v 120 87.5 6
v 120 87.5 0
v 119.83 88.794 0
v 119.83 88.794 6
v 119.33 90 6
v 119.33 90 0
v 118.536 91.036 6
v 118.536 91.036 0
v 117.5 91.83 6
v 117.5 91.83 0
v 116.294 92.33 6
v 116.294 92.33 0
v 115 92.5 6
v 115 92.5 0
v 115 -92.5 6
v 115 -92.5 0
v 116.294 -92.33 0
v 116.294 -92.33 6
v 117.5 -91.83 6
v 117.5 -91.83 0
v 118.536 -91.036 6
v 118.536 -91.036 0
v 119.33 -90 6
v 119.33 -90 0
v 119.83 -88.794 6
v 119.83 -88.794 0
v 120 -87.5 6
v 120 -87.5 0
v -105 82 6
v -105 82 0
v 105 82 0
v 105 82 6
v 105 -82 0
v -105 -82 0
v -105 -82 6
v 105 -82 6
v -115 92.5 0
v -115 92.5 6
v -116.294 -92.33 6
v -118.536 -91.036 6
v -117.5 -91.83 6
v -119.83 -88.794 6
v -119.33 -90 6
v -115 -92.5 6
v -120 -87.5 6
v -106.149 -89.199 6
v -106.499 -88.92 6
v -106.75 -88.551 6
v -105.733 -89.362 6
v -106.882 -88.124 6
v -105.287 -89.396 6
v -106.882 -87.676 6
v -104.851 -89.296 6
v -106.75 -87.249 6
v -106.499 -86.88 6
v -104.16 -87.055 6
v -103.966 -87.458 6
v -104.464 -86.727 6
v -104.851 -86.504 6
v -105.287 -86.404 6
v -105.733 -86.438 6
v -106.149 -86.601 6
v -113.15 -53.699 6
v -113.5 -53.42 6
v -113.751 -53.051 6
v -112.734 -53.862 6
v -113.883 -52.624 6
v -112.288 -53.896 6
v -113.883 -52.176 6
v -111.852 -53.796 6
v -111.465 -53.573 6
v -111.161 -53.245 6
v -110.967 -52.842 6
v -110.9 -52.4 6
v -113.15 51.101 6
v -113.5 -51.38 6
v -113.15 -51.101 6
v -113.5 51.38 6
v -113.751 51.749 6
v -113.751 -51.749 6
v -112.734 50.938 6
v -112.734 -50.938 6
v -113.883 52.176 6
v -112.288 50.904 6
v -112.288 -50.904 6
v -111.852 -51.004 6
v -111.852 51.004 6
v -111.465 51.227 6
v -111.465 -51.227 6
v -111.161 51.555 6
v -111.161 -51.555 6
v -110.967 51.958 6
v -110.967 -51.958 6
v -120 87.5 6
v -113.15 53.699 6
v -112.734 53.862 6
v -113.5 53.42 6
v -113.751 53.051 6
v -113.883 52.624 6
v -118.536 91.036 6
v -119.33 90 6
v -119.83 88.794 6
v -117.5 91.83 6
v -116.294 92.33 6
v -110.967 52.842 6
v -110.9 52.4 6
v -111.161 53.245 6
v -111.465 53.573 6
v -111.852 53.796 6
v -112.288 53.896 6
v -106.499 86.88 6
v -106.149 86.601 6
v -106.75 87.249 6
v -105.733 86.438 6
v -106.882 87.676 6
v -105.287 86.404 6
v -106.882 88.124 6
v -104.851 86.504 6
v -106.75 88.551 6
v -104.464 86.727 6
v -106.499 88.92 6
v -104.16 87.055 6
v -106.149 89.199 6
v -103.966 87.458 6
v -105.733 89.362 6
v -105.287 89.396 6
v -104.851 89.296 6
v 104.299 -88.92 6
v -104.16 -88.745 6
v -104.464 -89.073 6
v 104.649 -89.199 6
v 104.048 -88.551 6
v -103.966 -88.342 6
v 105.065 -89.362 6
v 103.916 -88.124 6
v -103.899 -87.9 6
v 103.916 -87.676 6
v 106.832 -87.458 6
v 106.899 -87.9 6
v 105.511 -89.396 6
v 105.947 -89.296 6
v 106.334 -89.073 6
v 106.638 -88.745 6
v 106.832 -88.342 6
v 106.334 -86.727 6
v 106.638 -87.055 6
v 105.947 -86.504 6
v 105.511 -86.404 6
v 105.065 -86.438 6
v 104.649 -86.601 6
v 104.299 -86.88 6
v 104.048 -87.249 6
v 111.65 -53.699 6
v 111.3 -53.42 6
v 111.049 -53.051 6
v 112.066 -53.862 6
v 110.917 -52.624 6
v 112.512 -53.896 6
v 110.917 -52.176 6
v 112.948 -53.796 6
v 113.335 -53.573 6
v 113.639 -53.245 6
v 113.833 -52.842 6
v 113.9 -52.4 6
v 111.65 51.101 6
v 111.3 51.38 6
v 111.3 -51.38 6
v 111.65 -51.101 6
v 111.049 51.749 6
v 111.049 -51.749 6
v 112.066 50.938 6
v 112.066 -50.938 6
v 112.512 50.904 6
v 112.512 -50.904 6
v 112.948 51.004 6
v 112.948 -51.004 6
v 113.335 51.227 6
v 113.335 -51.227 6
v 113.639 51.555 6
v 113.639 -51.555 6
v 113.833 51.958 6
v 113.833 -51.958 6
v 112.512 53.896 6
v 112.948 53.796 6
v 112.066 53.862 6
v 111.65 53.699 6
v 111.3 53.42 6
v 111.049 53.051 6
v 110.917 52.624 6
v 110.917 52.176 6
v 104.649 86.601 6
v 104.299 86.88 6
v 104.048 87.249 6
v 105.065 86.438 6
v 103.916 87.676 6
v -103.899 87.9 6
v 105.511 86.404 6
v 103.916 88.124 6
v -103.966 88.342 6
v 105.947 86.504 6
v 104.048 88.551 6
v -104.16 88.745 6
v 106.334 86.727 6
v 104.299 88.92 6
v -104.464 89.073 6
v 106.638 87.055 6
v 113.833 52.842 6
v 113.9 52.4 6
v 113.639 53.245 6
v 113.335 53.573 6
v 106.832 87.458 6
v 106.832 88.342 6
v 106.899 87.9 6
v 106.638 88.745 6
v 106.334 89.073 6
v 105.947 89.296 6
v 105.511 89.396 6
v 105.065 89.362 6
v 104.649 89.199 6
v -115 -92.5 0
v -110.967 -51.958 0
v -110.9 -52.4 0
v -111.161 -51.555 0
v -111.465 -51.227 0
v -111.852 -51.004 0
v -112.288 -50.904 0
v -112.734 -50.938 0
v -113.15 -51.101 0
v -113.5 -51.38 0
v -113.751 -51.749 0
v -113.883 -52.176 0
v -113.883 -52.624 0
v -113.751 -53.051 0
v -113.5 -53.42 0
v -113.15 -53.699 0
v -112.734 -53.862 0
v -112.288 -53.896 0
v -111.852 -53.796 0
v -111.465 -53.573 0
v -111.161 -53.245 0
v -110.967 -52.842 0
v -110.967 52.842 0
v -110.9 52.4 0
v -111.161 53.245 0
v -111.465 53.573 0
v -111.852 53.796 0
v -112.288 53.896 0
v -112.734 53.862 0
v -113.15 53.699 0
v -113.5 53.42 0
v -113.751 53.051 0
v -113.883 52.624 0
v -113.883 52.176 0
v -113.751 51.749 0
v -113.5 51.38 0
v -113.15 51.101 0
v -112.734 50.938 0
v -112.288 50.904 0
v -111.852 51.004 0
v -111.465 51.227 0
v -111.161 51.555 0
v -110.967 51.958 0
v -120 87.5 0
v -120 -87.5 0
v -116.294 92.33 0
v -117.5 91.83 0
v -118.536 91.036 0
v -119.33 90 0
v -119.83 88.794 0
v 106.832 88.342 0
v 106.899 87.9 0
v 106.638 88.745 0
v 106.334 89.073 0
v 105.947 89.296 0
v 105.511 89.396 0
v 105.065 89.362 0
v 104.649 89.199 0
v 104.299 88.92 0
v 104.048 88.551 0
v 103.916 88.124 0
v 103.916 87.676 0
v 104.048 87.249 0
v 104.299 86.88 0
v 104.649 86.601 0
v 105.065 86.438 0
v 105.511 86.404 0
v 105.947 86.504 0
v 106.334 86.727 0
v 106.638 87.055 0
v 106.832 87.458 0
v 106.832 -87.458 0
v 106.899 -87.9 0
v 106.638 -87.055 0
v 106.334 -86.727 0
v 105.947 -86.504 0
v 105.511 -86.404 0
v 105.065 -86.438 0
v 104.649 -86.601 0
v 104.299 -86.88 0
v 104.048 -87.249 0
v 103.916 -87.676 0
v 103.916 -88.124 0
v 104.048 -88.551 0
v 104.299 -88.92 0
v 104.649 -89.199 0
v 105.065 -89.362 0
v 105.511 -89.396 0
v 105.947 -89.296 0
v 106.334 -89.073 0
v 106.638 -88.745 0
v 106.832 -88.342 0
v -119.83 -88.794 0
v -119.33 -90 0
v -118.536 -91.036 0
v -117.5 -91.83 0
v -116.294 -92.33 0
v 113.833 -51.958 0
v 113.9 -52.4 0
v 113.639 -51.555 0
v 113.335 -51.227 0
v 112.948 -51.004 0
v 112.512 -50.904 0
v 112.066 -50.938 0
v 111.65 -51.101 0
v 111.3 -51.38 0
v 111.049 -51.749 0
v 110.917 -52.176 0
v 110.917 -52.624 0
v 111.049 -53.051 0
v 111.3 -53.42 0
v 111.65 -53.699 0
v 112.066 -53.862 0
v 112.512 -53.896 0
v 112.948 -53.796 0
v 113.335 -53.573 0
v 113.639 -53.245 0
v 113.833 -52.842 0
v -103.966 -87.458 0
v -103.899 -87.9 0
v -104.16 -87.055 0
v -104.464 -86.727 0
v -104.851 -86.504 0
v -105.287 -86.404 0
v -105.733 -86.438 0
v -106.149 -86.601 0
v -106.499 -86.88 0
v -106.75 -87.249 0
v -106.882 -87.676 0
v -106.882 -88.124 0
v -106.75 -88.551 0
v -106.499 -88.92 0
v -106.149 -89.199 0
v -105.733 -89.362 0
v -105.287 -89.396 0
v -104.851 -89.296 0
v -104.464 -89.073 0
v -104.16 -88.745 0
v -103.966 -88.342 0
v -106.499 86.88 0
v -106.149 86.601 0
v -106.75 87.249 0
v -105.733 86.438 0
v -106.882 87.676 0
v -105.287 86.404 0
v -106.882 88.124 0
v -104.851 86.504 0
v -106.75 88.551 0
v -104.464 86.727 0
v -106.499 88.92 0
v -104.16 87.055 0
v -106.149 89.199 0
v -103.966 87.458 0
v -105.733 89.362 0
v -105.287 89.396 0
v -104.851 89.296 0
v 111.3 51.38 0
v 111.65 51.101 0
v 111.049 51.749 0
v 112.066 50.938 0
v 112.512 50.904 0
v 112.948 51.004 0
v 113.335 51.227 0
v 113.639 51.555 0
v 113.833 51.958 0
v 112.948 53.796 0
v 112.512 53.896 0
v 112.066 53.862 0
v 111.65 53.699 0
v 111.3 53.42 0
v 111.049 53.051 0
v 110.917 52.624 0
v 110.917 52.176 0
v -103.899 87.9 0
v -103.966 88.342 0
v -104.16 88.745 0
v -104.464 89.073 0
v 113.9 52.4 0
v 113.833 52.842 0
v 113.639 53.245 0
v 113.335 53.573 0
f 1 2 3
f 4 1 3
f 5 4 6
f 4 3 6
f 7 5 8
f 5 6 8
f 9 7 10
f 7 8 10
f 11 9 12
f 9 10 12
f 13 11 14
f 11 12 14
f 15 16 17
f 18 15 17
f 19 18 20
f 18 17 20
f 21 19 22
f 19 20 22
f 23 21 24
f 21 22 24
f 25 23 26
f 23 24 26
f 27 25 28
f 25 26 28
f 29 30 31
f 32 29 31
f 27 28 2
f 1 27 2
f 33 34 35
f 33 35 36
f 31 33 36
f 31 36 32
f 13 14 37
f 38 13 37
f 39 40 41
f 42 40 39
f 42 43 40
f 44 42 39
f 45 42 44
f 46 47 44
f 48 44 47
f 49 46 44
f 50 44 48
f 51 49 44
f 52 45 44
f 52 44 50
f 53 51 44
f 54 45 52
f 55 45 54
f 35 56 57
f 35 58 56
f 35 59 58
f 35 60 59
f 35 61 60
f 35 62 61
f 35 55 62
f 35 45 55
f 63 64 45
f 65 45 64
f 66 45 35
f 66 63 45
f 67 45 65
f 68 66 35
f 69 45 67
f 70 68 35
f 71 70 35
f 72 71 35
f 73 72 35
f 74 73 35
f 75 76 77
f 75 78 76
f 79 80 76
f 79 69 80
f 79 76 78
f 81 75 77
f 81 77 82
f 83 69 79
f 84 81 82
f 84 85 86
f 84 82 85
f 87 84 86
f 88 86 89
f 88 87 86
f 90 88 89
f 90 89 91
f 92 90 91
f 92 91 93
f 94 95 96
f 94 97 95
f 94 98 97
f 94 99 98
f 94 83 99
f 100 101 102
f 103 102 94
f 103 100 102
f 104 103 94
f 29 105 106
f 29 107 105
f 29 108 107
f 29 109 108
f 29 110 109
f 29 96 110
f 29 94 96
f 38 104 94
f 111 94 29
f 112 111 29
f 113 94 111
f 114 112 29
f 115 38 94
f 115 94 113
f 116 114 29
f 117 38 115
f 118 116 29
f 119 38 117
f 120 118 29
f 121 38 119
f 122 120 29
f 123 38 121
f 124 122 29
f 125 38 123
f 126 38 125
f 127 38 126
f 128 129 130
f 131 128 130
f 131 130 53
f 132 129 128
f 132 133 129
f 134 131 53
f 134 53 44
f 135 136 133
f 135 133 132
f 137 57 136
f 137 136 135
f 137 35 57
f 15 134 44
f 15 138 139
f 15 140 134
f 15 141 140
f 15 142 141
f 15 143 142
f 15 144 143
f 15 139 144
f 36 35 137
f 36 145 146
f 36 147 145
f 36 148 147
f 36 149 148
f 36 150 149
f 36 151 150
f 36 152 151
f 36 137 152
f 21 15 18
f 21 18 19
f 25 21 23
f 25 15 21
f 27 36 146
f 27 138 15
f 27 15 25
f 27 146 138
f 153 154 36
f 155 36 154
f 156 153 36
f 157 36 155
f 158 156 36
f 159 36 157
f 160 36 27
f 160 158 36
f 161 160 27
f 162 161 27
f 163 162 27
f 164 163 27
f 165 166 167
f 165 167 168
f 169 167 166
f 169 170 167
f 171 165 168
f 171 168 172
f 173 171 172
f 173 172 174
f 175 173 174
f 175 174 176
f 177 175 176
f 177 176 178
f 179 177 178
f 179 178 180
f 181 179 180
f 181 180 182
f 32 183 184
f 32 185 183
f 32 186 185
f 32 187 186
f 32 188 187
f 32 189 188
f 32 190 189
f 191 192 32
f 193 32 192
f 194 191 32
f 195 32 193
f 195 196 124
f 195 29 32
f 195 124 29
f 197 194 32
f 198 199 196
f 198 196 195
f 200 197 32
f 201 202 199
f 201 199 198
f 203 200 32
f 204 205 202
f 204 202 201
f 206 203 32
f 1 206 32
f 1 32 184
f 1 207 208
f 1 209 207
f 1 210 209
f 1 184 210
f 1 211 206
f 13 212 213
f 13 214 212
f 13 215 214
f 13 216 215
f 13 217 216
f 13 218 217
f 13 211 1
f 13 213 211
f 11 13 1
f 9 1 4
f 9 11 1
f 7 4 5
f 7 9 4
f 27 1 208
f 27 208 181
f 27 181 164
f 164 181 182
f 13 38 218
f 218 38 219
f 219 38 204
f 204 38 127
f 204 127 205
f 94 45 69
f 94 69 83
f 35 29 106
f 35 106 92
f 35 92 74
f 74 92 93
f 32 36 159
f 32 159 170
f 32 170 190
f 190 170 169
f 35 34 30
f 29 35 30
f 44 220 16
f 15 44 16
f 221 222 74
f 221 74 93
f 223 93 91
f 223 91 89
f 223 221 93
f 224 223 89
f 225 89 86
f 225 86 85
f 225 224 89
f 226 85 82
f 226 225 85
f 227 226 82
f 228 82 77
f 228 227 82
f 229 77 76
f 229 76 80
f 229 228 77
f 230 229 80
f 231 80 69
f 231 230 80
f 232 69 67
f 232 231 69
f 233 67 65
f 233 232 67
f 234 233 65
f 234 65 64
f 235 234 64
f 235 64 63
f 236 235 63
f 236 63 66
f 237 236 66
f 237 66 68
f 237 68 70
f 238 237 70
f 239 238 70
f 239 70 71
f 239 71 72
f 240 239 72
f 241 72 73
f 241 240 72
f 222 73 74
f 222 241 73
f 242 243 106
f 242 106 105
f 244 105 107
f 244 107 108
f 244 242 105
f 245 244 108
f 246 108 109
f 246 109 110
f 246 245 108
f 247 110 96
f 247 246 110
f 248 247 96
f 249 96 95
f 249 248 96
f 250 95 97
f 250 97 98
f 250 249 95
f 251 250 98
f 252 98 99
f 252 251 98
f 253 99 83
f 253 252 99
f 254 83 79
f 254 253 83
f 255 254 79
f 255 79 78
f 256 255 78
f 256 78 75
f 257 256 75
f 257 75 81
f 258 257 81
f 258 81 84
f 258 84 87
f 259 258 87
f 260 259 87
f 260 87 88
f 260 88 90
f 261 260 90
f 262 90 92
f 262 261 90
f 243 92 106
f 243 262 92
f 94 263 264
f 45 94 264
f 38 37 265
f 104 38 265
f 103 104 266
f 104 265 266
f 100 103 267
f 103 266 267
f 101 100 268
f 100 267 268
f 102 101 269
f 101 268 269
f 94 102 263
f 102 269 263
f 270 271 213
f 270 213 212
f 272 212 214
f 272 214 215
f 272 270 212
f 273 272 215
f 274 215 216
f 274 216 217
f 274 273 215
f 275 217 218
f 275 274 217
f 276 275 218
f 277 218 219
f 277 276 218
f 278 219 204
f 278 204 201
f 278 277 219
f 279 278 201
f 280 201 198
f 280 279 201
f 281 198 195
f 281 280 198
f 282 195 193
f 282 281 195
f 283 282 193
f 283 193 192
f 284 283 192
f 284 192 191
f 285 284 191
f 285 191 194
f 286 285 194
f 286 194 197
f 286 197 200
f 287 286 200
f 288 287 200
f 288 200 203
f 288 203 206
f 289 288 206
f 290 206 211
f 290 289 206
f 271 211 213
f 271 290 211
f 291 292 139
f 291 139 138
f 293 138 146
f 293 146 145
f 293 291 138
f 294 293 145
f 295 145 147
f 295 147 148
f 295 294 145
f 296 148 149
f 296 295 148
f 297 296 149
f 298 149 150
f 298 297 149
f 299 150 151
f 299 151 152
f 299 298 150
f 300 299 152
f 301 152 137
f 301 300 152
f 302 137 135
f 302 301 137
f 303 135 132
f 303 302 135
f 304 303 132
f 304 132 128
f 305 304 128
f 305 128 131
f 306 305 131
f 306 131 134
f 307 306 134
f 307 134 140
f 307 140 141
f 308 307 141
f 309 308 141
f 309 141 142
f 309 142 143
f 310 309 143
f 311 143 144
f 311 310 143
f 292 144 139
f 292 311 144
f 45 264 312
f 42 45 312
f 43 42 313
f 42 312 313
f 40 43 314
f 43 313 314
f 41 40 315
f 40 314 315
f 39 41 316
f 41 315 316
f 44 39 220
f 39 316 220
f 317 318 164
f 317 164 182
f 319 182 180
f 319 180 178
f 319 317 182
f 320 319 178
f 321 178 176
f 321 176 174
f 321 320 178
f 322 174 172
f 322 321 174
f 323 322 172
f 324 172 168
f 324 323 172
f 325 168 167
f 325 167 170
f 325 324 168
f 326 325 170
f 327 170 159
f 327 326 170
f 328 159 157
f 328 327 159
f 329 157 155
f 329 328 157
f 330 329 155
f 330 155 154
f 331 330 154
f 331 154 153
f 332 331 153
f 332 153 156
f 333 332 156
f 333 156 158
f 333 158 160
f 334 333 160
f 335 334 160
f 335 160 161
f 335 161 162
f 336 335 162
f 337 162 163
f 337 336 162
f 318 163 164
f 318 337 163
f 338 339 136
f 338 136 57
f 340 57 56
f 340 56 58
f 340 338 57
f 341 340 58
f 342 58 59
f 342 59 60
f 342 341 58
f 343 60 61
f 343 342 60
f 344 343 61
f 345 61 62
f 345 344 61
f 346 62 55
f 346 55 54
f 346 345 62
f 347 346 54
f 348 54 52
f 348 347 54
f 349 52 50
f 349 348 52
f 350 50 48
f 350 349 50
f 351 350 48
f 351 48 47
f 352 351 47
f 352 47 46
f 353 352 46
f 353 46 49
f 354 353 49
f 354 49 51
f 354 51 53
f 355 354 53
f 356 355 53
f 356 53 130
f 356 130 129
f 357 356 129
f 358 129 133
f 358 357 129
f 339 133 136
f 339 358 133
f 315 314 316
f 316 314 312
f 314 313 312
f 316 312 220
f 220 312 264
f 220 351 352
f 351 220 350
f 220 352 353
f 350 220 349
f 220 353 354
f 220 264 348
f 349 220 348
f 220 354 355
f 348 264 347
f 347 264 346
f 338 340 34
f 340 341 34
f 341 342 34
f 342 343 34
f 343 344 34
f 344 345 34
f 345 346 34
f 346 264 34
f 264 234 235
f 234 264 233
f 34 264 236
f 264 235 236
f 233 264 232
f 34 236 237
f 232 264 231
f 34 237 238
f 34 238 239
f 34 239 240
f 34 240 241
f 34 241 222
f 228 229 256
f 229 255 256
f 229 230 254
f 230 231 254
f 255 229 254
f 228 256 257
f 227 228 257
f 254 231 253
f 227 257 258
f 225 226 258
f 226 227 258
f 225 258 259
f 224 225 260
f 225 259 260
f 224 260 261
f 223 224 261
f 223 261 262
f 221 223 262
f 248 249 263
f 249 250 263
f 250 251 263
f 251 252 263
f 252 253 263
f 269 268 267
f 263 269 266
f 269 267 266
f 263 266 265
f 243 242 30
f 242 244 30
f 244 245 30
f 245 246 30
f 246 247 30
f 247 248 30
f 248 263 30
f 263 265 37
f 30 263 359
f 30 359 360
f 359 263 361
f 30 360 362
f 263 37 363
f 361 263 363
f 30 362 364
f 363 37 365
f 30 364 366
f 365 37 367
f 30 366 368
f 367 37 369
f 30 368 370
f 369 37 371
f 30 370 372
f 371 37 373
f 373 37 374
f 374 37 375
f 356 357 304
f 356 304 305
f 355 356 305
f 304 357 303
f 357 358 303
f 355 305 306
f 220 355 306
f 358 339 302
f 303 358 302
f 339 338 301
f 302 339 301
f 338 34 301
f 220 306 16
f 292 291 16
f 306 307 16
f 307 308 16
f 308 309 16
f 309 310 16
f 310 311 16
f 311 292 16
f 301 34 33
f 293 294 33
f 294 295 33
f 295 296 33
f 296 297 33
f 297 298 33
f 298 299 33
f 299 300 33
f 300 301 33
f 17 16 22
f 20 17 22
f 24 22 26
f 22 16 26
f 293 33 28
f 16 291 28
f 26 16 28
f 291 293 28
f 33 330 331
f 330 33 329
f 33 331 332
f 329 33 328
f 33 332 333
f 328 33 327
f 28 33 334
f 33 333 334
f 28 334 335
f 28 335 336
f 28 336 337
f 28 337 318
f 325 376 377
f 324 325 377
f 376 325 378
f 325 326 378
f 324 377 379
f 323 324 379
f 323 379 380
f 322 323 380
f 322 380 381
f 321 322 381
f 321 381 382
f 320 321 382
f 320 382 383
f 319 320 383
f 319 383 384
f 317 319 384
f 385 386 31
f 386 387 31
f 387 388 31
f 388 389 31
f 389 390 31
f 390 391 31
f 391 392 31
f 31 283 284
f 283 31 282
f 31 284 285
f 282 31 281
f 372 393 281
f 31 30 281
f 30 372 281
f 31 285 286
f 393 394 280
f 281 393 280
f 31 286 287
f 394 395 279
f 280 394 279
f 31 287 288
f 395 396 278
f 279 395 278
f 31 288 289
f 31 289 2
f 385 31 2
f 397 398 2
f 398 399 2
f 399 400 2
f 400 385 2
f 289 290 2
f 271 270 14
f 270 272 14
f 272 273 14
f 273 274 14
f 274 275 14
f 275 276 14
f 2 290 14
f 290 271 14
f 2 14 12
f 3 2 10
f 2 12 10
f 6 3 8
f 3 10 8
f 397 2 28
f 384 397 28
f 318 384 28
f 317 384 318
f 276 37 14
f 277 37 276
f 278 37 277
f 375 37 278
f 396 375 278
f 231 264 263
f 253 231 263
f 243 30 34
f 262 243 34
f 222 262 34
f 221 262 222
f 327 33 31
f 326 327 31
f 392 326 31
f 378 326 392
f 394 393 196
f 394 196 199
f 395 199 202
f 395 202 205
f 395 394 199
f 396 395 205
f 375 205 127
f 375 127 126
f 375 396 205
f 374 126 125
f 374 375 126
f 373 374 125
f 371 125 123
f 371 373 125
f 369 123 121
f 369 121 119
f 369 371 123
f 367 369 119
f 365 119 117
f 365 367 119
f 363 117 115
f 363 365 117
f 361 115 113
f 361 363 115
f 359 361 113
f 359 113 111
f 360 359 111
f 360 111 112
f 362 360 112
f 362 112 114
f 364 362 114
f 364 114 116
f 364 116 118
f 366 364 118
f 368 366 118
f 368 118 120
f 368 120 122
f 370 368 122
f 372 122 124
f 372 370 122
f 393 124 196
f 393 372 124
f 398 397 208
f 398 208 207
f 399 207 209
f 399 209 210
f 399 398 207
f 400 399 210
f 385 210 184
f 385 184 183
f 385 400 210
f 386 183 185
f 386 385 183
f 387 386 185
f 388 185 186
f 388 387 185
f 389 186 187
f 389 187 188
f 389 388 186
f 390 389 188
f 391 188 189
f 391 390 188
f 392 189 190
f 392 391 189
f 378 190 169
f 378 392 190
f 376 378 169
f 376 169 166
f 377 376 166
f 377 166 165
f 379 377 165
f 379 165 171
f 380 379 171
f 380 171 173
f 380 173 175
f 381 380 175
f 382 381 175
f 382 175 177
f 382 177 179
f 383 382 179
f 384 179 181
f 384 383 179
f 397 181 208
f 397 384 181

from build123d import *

# Parameters (mm, degrees)
F0_R     = 1.5
F0_W     = 210
F0_H     = 164
F1_DEPTH = 6


with BuildPart() as f1:
    # F0 (on Top) → F1 (new body)
    with BuildSketch(Plane.XY):
        with BuildLine():
            Line((-115, -92.5), (115, -92.5))
            ThreePointArc((115, -92.5), (118.535534, -91.035534), (120, -87.5))
            Line((120, -87.5), (120, 87.5))
            ThreePointArc((120, 87.5), (118.535534, 91.035534), (115, 92.5))
            Line((115, 92.5), (-115, 92.5))
            ThreePointArc((-115, 92.5), (-118.535534, 91.035534), (-120, 87.5))
            Line((-120, 87.5), (-120, -87.5))
            ThreePointArc((-120, -87.5), (-118.535534, -91.035534), (-115, -92.5))
        make_face()
        with Locations((-105.399, -87.9)):
            Circle(F0_R, mode=Mode.SUBTRACT)
        with Locations((-112.4, -52.4)):
            Circle(F0_R, mode=Mode.SUBTRACT)
        with Locations((105.399, -87.9)):
            Circle(F0_R, mode=Mode.SUBTRACT)
        with Locations((112.4, -52.4)):
            Circle(F0_R, mode=Mode.SUBTRACT)
        with Locations((-112.4, 52.4)):
            Circle(F0_R, mode=Mode.SUBTRACT)
        with Locations((-105.399, 87.9)):
            Circle(F0_R, mode=Mode.SUBTRACT)
        Rectangle(F0_W, F0_H, mode=Mode.SUBTRACT)
        with Locations((112.4, 52.4)):
            Circle(F0_R, mode=Mode.SUBTRACT)
        with Locations((105.399, 87.9)):
            Circle(F0_R, mode=Mode.SUBTRACT)
    extrude(amount=F1_DEPTH)


solid = f1.part
